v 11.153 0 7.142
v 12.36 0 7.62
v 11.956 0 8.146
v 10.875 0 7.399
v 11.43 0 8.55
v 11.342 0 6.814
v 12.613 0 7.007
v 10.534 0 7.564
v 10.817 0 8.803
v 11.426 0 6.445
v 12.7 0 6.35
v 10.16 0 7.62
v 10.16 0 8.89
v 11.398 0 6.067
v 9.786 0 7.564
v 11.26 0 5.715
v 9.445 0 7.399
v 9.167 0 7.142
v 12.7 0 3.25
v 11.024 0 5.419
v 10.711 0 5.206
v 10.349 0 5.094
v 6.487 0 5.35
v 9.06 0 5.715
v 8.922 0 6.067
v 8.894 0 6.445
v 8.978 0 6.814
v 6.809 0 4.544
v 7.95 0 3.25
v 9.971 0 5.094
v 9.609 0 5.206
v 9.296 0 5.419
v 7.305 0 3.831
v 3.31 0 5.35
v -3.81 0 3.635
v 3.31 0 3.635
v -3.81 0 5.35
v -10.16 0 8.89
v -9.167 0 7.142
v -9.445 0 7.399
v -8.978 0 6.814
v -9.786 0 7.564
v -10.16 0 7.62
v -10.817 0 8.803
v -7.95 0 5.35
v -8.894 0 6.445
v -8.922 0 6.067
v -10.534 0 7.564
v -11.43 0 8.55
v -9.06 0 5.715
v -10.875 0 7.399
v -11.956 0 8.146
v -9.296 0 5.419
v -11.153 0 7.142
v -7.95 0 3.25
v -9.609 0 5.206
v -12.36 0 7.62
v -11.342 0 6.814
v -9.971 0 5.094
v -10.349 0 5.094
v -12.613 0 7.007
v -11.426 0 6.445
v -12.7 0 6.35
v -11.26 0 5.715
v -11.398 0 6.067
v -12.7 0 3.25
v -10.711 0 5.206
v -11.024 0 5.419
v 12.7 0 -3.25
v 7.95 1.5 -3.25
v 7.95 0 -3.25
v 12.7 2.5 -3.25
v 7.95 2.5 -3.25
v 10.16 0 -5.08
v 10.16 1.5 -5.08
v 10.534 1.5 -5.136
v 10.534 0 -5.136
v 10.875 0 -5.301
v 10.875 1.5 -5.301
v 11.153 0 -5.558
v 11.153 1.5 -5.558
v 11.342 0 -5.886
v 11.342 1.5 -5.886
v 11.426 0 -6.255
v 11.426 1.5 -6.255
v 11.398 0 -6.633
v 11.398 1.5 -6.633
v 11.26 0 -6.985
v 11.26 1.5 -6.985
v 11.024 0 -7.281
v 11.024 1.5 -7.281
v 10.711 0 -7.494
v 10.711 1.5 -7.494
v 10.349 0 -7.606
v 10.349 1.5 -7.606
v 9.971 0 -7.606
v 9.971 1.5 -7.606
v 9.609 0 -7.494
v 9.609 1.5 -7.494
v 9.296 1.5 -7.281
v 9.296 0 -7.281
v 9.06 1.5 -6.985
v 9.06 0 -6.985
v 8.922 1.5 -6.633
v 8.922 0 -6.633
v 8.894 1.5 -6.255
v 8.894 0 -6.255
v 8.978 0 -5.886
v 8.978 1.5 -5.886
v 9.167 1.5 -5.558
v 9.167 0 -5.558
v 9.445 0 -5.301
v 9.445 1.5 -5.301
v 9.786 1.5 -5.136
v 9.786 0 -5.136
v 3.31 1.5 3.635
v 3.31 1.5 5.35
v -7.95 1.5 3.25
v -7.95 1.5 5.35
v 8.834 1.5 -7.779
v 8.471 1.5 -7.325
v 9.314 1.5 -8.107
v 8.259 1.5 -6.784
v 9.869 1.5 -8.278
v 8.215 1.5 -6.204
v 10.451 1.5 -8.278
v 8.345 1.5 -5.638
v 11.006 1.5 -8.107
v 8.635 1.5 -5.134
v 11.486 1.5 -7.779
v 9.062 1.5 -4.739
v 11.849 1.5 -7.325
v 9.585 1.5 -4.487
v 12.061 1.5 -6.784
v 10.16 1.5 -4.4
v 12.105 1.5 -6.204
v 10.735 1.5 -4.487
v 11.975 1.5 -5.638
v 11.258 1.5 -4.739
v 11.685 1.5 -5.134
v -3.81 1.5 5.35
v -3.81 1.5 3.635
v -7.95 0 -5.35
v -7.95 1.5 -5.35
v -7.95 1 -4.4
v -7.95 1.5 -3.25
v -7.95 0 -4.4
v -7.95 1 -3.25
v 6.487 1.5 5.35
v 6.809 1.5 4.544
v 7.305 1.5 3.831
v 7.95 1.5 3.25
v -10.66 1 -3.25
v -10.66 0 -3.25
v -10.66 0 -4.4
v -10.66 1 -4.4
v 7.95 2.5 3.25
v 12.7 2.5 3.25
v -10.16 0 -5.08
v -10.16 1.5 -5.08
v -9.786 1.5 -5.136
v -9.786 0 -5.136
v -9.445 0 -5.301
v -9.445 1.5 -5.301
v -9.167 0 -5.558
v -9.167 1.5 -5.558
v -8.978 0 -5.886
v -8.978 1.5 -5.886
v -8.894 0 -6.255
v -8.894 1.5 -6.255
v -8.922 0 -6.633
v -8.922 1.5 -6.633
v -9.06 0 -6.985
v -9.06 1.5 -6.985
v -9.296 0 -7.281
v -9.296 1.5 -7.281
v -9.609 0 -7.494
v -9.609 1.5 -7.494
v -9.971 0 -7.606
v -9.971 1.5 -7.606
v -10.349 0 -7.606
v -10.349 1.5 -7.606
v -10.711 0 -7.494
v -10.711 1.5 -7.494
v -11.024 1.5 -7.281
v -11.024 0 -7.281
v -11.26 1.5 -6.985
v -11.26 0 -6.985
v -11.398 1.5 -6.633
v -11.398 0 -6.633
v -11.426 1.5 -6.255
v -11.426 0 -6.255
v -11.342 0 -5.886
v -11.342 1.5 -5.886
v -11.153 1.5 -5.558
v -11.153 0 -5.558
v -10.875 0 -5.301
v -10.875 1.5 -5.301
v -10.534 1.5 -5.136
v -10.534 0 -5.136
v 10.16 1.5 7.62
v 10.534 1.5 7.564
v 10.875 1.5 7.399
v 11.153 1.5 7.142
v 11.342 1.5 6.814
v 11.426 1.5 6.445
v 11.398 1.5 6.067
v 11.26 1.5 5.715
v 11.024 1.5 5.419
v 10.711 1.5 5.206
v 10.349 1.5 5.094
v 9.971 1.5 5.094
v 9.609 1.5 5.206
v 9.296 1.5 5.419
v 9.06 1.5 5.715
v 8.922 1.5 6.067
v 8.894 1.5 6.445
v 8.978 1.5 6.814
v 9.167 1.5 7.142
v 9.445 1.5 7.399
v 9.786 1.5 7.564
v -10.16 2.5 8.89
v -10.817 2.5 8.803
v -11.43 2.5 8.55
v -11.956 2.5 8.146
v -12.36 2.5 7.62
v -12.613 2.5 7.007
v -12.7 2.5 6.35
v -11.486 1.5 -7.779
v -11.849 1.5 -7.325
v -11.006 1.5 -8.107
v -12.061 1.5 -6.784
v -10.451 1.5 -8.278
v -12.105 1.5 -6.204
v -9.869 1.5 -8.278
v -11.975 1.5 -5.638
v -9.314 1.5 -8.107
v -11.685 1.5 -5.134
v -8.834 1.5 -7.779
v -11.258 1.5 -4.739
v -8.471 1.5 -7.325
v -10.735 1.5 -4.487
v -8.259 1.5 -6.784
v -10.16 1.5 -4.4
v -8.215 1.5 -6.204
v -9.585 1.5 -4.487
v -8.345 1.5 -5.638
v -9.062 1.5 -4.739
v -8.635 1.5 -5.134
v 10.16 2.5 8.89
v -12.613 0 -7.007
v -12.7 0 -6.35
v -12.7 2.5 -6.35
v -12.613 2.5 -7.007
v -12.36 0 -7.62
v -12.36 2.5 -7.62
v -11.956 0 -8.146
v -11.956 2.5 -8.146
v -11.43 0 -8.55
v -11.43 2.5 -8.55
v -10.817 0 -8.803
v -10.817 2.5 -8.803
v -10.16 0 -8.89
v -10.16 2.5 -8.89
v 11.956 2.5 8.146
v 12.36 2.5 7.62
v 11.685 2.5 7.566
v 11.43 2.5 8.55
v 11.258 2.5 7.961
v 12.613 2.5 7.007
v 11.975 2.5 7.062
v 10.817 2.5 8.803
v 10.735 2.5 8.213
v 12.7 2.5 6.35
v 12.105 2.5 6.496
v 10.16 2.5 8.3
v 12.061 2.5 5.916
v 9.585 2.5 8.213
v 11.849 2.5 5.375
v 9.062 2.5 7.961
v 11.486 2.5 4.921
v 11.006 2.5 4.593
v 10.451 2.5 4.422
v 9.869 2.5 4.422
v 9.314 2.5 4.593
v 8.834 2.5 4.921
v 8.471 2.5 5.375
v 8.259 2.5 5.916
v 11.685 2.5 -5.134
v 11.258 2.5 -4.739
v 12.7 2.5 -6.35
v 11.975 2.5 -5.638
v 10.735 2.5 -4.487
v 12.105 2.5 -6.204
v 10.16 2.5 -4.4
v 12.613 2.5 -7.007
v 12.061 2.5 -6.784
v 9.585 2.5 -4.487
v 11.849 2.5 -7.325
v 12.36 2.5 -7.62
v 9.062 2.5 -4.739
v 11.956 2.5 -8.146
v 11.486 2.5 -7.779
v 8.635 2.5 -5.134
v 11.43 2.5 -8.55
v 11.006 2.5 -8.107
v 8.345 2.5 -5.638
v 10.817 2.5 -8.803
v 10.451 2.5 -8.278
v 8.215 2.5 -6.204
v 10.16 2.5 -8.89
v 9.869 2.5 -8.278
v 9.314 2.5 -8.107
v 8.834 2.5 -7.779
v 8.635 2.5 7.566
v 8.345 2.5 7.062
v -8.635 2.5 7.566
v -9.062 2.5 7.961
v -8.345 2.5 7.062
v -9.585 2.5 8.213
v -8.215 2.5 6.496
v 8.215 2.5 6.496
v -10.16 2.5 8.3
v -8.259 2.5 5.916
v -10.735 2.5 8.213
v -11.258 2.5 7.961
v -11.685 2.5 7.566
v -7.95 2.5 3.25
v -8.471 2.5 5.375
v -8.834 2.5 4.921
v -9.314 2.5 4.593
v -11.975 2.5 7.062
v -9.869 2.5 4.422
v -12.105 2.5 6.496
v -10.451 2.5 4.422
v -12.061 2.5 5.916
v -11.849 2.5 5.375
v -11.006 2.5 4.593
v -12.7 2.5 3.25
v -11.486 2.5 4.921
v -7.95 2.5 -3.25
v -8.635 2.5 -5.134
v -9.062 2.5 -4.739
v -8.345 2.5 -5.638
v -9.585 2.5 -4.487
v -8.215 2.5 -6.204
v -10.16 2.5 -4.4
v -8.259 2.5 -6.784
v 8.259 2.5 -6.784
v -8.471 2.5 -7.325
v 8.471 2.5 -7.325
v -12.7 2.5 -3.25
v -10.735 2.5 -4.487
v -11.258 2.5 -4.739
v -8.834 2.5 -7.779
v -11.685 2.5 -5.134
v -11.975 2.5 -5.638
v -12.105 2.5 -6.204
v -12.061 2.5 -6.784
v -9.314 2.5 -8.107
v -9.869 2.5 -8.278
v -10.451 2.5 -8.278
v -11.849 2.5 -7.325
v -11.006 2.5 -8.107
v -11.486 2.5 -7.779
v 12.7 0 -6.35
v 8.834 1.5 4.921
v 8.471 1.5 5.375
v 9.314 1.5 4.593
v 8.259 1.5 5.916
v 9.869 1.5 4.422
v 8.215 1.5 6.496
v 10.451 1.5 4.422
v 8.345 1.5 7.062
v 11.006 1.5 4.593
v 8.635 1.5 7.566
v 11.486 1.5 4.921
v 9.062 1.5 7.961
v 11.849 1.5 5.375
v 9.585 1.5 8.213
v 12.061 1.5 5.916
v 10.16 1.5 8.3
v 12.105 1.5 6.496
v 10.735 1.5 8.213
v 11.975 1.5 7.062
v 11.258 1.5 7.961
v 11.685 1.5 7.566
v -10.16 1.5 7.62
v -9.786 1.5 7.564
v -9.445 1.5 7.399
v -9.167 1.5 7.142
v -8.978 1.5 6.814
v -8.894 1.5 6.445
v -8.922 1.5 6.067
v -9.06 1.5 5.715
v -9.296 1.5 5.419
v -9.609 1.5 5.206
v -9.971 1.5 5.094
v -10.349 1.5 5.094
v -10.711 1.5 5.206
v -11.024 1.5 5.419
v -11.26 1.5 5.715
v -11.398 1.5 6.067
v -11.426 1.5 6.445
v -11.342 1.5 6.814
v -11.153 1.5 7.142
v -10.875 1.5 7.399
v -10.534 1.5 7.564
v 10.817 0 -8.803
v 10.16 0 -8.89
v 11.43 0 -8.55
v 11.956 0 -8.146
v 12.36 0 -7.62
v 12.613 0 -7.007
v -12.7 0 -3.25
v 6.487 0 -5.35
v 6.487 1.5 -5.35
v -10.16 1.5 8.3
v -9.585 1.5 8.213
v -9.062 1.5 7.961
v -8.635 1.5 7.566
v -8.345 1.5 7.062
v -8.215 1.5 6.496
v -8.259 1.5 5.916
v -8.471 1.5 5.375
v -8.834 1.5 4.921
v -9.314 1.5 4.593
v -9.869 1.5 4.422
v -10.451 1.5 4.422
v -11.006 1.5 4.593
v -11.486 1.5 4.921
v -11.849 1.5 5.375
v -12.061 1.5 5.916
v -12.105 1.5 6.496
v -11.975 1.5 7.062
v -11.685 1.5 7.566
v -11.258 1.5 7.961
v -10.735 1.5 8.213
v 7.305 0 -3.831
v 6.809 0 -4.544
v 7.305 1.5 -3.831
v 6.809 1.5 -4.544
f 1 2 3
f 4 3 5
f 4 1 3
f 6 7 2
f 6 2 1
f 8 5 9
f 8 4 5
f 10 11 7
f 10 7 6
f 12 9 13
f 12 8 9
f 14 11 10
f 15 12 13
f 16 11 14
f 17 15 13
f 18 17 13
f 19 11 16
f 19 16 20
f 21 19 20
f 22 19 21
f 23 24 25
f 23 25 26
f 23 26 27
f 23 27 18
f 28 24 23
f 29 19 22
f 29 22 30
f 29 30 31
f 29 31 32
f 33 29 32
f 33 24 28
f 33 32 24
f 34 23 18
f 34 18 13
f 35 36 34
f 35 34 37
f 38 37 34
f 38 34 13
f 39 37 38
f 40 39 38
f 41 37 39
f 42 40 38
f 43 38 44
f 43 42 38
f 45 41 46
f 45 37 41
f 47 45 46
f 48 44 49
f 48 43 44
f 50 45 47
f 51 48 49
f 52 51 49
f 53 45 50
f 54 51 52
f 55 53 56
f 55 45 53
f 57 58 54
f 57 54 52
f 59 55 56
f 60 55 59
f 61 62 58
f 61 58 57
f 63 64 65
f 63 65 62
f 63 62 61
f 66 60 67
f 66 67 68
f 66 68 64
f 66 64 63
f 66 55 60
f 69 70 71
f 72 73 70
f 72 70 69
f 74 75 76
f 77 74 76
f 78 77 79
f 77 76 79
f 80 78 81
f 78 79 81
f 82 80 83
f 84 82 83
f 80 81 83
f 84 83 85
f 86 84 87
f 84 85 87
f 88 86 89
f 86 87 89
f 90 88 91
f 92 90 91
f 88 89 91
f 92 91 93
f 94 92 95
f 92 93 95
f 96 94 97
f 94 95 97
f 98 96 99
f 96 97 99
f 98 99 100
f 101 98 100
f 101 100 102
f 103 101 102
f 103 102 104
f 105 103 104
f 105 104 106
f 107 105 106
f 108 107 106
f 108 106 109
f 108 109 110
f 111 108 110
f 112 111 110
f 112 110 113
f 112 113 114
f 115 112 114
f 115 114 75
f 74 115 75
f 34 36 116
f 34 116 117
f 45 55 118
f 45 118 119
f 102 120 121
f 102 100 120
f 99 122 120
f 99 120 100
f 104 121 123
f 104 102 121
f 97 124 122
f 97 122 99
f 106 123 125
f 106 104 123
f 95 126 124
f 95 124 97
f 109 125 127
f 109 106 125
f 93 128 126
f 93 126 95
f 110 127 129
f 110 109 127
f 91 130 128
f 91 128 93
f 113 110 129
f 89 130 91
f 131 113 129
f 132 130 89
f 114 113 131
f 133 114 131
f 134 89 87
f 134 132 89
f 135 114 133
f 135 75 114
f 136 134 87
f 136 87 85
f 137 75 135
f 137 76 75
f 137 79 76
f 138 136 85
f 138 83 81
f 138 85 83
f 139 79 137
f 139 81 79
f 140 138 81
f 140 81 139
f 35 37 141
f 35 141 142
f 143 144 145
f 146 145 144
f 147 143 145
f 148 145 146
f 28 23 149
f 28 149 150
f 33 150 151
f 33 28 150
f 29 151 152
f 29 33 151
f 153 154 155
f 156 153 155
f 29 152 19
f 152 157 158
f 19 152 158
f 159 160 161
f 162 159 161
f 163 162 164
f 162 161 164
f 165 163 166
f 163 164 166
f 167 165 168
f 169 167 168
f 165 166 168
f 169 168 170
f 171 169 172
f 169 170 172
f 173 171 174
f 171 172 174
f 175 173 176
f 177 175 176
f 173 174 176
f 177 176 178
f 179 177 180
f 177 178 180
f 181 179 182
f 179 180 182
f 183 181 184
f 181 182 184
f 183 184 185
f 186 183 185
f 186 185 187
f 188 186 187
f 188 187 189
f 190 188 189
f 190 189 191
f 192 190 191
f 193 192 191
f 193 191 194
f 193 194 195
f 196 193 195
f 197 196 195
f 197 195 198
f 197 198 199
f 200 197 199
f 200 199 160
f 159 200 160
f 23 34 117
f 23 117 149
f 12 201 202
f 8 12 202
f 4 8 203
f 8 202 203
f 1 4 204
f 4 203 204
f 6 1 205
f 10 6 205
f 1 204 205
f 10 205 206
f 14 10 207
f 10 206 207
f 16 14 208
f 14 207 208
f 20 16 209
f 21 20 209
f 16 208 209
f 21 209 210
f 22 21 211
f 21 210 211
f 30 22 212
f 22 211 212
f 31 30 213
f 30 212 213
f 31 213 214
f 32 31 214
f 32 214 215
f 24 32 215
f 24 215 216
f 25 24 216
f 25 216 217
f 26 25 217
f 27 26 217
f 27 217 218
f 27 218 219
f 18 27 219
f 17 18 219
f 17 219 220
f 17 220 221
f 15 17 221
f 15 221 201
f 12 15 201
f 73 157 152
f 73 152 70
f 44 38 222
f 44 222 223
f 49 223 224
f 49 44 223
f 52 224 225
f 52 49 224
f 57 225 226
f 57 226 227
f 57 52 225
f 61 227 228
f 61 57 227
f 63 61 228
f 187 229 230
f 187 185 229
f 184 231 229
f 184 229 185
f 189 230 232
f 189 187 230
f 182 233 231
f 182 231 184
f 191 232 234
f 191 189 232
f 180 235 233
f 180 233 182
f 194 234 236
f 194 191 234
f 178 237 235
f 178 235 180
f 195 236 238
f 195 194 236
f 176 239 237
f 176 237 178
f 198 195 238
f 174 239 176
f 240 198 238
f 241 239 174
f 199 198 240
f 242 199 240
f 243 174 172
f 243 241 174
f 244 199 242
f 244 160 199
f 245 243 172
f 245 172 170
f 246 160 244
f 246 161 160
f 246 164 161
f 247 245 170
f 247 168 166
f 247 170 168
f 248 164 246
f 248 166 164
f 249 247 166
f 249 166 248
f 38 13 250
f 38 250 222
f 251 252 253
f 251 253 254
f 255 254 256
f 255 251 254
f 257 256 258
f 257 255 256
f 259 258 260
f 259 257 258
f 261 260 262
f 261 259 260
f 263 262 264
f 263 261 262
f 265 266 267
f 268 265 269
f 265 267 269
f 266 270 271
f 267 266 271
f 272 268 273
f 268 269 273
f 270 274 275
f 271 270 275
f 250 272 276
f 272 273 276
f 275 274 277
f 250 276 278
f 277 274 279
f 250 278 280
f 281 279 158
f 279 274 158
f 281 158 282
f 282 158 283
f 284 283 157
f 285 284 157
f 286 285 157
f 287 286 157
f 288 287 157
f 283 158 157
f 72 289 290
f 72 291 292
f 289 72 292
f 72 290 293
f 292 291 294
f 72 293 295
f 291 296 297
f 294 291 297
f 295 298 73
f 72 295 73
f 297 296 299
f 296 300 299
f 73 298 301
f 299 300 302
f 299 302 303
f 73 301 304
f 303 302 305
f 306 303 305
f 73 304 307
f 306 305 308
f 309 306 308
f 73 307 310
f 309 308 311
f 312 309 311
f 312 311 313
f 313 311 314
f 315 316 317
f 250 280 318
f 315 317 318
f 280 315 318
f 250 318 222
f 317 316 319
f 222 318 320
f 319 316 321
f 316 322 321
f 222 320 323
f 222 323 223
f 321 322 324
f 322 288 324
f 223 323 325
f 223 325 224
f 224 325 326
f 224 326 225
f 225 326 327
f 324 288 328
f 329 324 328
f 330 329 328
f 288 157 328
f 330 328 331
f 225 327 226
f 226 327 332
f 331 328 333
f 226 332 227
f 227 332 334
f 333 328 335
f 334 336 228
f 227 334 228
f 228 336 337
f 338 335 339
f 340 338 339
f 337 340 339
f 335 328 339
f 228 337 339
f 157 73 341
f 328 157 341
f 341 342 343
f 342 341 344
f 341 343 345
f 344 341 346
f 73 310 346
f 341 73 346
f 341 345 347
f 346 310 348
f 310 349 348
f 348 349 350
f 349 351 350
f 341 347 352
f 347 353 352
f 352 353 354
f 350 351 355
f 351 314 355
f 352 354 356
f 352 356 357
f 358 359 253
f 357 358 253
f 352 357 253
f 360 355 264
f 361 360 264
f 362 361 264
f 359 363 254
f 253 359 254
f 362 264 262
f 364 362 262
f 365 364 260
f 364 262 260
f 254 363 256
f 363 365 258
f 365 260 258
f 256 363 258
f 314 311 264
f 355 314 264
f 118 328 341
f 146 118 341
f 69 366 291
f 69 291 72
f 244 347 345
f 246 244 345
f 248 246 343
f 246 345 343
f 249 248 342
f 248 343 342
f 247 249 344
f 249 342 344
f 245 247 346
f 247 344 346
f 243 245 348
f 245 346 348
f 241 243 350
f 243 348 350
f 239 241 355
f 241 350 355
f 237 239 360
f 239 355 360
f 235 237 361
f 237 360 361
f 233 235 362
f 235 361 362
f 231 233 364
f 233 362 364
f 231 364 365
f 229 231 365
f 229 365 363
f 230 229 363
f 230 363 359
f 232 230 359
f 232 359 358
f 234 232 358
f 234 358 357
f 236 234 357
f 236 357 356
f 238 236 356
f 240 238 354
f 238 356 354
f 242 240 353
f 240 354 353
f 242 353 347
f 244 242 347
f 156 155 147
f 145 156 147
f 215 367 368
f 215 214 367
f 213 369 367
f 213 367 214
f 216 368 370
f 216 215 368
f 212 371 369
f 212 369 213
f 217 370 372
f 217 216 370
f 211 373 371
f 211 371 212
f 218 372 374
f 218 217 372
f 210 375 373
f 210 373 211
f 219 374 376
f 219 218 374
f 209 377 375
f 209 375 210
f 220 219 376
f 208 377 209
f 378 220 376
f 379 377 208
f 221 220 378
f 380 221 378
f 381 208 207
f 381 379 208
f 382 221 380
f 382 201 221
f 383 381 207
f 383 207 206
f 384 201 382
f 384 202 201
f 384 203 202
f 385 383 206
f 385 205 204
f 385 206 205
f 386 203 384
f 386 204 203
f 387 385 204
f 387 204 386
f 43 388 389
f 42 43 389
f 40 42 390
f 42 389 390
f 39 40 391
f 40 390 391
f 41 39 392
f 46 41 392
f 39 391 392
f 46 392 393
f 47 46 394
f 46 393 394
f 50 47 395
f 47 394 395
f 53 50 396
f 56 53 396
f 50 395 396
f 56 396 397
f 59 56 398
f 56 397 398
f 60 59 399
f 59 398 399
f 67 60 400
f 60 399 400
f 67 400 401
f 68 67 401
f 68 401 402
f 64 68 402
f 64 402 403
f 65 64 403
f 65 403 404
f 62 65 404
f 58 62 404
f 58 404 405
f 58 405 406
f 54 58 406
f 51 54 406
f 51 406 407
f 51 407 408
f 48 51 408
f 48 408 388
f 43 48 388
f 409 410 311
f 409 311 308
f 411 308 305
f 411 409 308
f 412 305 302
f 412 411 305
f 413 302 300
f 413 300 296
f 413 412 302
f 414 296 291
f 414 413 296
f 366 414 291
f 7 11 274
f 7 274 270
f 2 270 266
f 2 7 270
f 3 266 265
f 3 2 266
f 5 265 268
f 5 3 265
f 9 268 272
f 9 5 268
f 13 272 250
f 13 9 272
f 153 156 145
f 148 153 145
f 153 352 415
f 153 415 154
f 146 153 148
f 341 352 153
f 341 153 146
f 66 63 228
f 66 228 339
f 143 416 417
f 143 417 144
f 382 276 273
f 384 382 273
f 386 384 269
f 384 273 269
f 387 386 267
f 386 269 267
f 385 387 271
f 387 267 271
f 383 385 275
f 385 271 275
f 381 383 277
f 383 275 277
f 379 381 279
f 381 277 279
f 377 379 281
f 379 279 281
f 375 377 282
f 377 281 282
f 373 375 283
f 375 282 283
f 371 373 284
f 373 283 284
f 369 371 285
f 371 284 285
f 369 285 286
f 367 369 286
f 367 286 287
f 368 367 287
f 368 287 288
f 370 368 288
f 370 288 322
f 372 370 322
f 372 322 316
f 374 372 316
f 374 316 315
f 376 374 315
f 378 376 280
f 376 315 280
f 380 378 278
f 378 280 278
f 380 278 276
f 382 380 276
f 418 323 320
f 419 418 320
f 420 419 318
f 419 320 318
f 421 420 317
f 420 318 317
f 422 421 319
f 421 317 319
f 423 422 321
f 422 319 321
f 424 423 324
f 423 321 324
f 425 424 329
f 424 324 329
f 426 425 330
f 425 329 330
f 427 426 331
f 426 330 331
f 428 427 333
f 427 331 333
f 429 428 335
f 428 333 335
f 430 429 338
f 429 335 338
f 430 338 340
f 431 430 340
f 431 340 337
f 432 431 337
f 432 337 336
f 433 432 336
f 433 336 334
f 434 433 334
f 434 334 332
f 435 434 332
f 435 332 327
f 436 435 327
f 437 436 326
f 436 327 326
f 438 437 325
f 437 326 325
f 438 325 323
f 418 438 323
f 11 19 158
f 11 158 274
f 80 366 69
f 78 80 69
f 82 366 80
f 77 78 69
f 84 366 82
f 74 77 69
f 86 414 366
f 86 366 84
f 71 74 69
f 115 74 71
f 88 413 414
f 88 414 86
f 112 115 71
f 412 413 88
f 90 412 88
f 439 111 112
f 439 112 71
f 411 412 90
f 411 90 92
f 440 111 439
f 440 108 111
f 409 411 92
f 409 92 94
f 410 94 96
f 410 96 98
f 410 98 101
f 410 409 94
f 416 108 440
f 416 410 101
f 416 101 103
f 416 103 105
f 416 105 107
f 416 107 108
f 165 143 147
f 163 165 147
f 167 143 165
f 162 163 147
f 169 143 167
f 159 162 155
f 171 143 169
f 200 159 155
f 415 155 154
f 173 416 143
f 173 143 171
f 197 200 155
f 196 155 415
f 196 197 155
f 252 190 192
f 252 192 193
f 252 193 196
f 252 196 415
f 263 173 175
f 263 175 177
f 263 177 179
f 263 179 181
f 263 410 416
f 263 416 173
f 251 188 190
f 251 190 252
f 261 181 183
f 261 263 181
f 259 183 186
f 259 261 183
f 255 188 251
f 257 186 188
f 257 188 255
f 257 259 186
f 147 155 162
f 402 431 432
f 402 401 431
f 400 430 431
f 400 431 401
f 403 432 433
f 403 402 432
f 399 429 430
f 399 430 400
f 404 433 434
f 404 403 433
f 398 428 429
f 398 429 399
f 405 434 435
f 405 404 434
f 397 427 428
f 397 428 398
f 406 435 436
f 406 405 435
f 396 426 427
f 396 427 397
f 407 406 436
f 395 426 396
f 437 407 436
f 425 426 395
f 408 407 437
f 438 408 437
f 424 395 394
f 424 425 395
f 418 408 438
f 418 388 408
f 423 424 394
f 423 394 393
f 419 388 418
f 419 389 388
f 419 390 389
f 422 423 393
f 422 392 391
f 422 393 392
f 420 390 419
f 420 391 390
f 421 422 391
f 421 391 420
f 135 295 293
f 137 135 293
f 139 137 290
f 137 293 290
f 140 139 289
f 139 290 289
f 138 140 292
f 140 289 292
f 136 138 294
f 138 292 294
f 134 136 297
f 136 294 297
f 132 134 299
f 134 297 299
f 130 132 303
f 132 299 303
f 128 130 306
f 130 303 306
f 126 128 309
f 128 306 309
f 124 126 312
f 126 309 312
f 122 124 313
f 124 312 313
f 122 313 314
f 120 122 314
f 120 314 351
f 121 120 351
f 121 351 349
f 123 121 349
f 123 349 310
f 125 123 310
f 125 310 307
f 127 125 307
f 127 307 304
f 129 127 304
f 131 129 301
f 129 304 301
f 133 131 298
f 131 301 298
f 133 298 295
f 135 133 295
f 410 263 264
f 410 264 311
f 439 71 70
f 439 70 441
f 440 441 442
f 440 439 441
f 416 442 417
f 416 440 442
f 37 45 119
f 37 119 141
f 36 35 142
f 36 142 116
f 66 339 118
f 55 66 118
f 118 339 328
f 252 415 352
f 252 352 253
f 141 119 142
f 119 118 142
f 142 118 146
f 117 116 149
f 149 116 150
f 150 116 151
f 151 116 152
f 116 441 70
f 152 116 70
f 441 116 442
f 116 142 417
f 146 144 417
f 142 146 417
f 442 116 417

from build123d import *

# Parameters (mm, degrees)
BOSS_EXTRUDE1_DEPTH = 2.5
SKETCH3_R           = 1.27
SKETCH3_W           = 4.75
SKETCH3_H           = 6.5
CUT_EXTRUDE2_DEPTH  = 16.702614432
CUT_EXTRUDE1_START  = -2.5
CUT_EXTRUDE1_DEPTH  = 1.5
SKETCH4_R           = 1.95
CUT_EXTRUDE3_DEPTH  = 1
CUT_EXTRUDE4_START  = -2.5
SKETCH5_W           = 2.71
SKETCH5_H           = 1.15
CUT_EXTRUDE4_DEPTH  = 1


with BuildPart() as part:
    # Sketch1 → Boss-Extrude1 (new body)
    with BuildSketch(Plane(origin=(0, 0, 0), x_dir=(1, 0, 0), z_dir=(0, 1, 0))):
        with BuildLine():
            Line((-10.16, 8.89), (10.16, 8.89))
            ThreePointArc((10.16, 8.89), (11.956051224, 8.146051224), (12.7, 6.35))
            Line((12.7, 6.35), (12.7, -6.35))
            ThreePointArc((12.7, -6.35), (11.956051224, -8.146051224), (10.16, -8.89))
            Line((10.16, -8.89), (-10.16, -8.89))
            ThreePointArc((-10.16, -8.89), (-11.956051224, -8.146051224), (-12.7, -6.35))
            Line((-12.7, -6.35), (-12.7, 6.35))
            ThreePointArc((-12.7, 6.35), (-11.956051224, 8.146051224), (-10.16, 8.89))
        make_face()
    extrude(amount=BOSS_EXTRUDE1_DEPTH)

    # Sketch3 → Cut-Extrude2 (cut, through all)
    with BuildSketch(Plane(origin=(0, 2.5, 0), x_dir=(1, 0, 0), z_dir=(0, 1, 0))):
        with Locations(Location((-10.16, 6.35, 0), (0, 0, 270))):
            Circle(SKETCH3_R)
        with Locations(Location((10.16, 6.35, 0), (0, 0, 270))):
            Circle(SKETCH3_R)
        with Locations(Location((10.16, -6.35, 0), (0, 0, 270))):
            Circle(SKETCH3_R)
        with Locations(Location((-10.16, -6.35, 0), (0, 0, 270))):
            Circle(SKETCH3_R)
        with Locations((10.325, 0)):
            Rectangle(SKETCH3_W, SKETCH3_H)
        with Locations((-10.325, 0)):
            Rectangle(SKETCH3_W, SKETCH3_H)
    extrude(amount=-CUT_EXTRUDE2_DEPTH, mode=Mode.SUBTRACT)

    # Sketch2 → Cut-Extrude1 (cut)
    with BuildSketch(Plane(origin=(0, 2.5, 0), x_dir=(1, 0, 0), z_dir=(0, 1, 0)).offset(CUT_EXTRUDE1_START)):
        with BuildLine():
            Line((-3.81, -5.35), (-3.81, -3.635))
            Line((-3.81, -3.635), (3.31, -3.635))
            Line((3.31, -3.635), (3.31, -5.35))
            Line((3.31, -5.35), (6.486568362, -5.35))
            ThreePointArc((6.486568362, -5.35), (7.036509651, -4.173326382), (7.95, -3.25))
            Line((7.95, -3.25), (12.7, -3.25))
            Line((12.7, -3.25), (12.7, 3.25))
            Line((12.7, 3.25), (7.95, 3.25))
            ThreePointArc((7.95, 3.25), (7.036509651, 4.173326382), (6.486568362, 5.35))
            Line((6.486568362, 5.35), (-7.95, 5.35))
            Line((-7.95, 5.35), (-7.95, 3.25))
            Line((-7.95, 3.25), (-12.7, 3.25))
            Line((-12.7, 3.25), (-12.7, -3.25))
            Line((-12.7, -3.25), (-7.95, -3.25))
            Line((-7.95, -3.25), (-7.95, -5.35))
            Line((-7.95, -5.35), (-3.81, -5.35))
        make_face()
    extrude(amount=CUT_EXTRUDE1_DEPTH, mode=Mode.SUBTRACT)

    # Sketch4 → Cut-Extrude3 (cut)
    with BuildSketch(Plane(origin=(0, 2.5, 0), x_dir=(1, 0, 0), z_dir=(0, 1, 0))):
        with Locations(Location((-10.16, 6.35, 0), (0, 0, 270))):
            Circle(SKETCH4_R)
        with Locations(Location((10.16, 6.35, 0), (0, 0, 270))):
            Circle(SKETCH4_R)
        with Locations(Location((-10.16, -6.35, 0), (0, 0, 270))):
            Circle(SKETCH4_R)
        with Locations(Location((10.16, -6.35, 0), (0, 0, 270))):
            Circle(SKETCH4_R)
    extrude(amount=-CUT_EXTRUDE3_DEPTH, mode=Mode.SUBTRACT)

    # Sketch5 → Cut-Extrude4 (cut)
    with BuildSketch(Plane(origin=(0, 2.5, 0), x_dir=(1, 0, 0), z_dir=(0, 1, 0)).offset(CUT_EXTRUDE4_START)):
        with Locations((-9.305, 3.825)):
            Rectangle(SKETCH5_W, SKETCH5_H)
    extrude(amount=CUT_EXTRUDE4_DEPTH, mode=Mode.SUBTRACT)


solid = part.part
